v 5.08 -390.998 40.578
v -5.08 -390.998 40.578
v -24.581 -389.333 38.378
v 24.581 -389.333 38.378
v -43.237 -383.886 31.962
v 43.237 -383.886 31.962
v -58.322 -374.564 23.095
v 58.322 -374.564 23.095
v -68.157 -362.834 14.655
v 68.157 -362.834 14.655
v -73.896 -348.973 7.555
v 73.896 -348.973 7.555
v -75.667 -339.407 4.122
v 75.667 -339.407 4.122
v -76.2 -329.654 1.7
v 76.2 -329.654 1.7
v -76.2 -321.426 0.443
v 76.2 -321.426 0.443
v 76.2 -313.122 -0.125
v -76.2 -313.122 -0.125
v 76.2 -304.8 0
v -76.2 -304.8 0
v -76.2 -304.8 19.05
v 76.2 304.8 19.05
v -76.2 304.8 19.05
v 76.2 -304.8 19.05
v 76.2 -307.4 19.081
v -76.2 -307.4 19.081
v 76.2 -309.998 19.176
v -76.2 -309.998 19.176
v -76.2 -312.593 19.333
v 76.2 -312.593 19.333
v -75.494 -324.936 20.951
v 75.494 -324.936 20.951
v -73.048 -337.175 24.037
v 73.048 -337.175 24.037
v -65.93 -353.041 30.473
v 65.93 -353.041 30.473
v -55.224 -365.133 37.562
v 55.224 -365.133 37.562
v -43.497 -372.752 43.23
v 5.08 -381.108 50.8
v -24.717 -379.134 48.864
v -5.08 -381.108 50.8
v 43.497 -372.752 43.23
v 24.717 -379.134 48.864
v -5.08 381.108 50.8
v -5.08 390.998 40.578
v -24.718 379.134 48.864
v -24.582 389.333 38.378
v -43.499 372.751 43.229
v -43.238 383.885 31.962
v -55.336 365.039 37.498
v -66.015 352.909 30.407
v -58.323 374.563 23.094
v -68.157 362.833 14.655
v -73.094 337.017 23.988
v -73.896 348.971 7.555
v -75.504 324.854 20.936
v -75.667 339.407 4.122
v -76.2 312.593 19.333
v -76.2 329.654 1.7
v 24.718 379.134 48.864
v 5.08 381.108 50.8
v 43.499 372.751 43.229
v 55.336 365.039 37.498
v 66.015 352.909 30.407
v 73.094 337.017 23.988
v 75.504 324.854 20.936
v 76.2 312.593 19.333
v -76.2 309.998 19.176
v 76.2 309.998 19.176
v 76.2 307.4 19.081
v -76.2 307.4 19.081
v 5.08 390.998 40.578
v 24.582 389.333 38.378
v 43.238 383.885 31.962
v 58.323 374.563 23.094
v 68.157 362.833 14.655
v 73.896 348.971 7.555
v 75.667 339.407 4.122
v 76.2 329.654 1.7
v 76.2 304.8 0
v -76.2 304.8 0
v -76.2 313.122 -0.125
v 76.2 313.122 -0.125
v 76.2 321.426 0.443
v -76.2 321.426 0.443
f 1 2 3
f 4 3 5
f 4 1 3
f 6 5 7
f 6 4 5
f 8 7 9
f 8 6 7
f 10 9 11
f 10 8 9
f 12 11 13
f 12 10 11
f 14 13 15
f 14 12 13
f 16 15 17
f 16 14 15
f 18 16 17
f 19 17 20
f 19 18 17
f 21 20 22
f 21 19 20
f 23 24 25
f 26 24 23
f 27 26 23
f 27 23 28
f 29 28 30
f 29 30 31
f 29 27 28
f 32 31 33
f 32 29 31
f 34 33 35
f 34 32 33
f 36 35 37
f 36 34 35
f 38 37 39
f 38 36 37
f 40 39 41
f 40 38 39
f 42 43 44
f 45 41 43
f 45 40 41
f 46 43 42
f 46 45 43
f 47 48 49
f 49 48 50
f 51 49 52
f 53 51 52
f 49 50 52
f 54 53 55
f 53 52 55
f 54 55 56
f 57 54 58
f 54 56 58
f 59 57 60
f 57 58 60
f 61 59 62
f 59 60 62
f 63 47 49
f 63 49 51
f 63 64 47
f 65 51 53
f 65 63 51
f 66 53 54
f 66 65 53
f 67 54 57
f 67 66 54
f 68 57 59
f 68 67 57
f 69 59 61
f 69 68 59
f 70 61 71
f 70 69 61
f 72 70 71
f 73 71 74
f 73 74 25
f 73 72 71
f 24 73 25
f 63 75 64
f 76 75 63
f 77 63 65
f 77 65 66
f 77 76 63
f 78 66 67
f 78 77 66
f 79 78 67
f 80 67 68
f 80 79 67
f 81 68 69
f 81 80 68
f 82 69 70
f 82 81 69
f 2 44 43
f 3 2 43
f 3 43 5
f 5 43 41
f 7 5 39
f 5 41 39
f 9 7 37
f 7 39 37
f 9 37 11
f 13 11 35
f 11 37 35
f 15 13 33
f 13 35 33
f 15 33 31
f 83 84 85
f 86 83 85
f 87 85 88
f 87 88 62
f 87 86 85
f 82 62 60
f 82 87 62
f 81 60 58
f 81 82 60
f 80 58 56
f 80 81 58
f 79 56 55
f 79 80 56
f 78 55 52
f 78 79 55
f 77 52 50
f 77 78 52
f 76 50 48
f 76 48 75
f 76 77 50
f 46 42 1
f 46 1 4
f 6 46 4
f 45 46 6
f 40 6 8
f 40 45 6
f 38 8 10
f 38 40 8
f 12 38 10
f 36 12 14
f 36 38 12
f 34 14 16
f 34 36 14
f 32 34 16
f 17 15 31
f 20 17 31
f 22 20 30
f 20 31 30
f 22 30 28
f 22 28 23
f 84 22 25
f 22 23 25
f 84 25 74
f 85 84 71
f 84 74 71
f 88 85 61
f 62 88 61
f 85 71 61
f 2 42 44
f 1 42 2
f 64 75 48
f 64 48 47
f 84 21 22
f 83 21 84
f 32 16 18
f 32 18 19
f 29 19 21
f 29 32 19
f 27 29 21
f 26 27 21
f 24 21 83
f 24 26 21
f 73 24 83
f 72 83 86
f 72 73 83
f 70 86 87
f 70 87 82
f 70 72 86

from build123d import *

# Parameters (mm, degrees)
F1_DEPTH    = 76.2
F2_T1_DEPTH = 369.824
F2_T3_DEPTH = 369.824


# Not quite as in the source:
# - a fillet or chamfer that OpenCascade refuses, or shapes differently, is made with other operations: its cross-section is extruded or revolved along the edge and cut away or added


with BuildPart() as f1:
    # F0 (on Right) → F1 (new body, symmetric)
    with BuildSketch(Plane.YZ):
        with BuildLine():
            Line((-304.8, 0), (0, 0))
            Line((0, 0), (304.8, 0))
            ThreePointArc((304.8, 0), (353.0430518596, 9.3618295777), (390.9983313803, 40.5777335736))
            Line((390.9983313803, 40.5777335736), (381.1075556217, 50.8))
            ThreePointArc((381.1075556217, 50.8), (346.1246462325, 27.304174222), (304.8, 19.05))
            Line((304.8, 19.05), (0, 19.05))
            Line((0, 19.05), (-304.8, 19.05))
            ThreePointArc((-304.8, 19.05), (-346.1246462325, 27.304174222), (-381.1075556217, 50.8))
            Line((-381.1075556217, 50.8), (-390.9983313803, 40.5777335736))
            ThreePointArc((-390.9983313803, 40.5777335736), (-353.0430518596, 9.3618295777), (-304.8, 0))
        make_face()
    extrude(amount=F1_DEPTH, both=True)

    # F2: fillet of radius 71.12 on 4 edges, made by hand

    # F2_s2 → F2_t1 (cut)
    with BuildSketch(Plane(origin=(0, -35.2534039099, -36.4349264406), x_dir=(1, 0, 0), z_dir=(0, -0.6953582507, -0.7186632752))):
        with BuildLine():
            ThreePointArc((5.08, 309.212203264), (55.369434278, 288.381637542), (76.2, 238.092203264))
            Line((76.2, 238.092203264), (76.2, 309.212203264))
            Line((76.2, 309.212203264), (5.08, 309.212203264))
        make_face()
        with BuildLine():
            ThreePointArc((-5.08, 309.212203264), (-55.369434278, 288.381637542), (-76.2, 238.092203264))
            Line((-76.2, 238.092203264), (-76.2, 309.212203264))
            Line((-76.2, 309.212203264), (-5.08, 309.212203264))
        make_face()
    extrude(amount=F2_T1_DEPTH, mode=Mode.SUBTRACT)

    # F2_s4 → F2_t3 (cut)
    with BuildSketch(Plane(origin=(0, 292.4135736338, -302.2138535277), x_dir=(1, 0, 0), z_dir=(0, -0.6953582507, 0.7186632752))):
        with BuildLine():
            ThreePointArc((5.08, 309.212203264), (55.369434278, 288.381637542), (76.2, 238.092203264))
            Line((76.2, 238.092203264), (76.2, 309.212203264))
            Line((76.2, 309.212203264), (5.08, 309.212203264))
        make_face()
        with BuildLine():
            ThreePointArc((-5.08, 309.212203264), (-55.369434278, 288.381637542), (-76.2, 238.092203264))
            Line((-76.2, 238.092203264), (-76.2, 309.212203264))
            Line((-76.2, 309.212203264), (-5.08, 309.212203264))
        make_face()
    extrude(amount=F2_T3_DEPTH, mode=Mode.SUBTRACT)


solid = f1.part
